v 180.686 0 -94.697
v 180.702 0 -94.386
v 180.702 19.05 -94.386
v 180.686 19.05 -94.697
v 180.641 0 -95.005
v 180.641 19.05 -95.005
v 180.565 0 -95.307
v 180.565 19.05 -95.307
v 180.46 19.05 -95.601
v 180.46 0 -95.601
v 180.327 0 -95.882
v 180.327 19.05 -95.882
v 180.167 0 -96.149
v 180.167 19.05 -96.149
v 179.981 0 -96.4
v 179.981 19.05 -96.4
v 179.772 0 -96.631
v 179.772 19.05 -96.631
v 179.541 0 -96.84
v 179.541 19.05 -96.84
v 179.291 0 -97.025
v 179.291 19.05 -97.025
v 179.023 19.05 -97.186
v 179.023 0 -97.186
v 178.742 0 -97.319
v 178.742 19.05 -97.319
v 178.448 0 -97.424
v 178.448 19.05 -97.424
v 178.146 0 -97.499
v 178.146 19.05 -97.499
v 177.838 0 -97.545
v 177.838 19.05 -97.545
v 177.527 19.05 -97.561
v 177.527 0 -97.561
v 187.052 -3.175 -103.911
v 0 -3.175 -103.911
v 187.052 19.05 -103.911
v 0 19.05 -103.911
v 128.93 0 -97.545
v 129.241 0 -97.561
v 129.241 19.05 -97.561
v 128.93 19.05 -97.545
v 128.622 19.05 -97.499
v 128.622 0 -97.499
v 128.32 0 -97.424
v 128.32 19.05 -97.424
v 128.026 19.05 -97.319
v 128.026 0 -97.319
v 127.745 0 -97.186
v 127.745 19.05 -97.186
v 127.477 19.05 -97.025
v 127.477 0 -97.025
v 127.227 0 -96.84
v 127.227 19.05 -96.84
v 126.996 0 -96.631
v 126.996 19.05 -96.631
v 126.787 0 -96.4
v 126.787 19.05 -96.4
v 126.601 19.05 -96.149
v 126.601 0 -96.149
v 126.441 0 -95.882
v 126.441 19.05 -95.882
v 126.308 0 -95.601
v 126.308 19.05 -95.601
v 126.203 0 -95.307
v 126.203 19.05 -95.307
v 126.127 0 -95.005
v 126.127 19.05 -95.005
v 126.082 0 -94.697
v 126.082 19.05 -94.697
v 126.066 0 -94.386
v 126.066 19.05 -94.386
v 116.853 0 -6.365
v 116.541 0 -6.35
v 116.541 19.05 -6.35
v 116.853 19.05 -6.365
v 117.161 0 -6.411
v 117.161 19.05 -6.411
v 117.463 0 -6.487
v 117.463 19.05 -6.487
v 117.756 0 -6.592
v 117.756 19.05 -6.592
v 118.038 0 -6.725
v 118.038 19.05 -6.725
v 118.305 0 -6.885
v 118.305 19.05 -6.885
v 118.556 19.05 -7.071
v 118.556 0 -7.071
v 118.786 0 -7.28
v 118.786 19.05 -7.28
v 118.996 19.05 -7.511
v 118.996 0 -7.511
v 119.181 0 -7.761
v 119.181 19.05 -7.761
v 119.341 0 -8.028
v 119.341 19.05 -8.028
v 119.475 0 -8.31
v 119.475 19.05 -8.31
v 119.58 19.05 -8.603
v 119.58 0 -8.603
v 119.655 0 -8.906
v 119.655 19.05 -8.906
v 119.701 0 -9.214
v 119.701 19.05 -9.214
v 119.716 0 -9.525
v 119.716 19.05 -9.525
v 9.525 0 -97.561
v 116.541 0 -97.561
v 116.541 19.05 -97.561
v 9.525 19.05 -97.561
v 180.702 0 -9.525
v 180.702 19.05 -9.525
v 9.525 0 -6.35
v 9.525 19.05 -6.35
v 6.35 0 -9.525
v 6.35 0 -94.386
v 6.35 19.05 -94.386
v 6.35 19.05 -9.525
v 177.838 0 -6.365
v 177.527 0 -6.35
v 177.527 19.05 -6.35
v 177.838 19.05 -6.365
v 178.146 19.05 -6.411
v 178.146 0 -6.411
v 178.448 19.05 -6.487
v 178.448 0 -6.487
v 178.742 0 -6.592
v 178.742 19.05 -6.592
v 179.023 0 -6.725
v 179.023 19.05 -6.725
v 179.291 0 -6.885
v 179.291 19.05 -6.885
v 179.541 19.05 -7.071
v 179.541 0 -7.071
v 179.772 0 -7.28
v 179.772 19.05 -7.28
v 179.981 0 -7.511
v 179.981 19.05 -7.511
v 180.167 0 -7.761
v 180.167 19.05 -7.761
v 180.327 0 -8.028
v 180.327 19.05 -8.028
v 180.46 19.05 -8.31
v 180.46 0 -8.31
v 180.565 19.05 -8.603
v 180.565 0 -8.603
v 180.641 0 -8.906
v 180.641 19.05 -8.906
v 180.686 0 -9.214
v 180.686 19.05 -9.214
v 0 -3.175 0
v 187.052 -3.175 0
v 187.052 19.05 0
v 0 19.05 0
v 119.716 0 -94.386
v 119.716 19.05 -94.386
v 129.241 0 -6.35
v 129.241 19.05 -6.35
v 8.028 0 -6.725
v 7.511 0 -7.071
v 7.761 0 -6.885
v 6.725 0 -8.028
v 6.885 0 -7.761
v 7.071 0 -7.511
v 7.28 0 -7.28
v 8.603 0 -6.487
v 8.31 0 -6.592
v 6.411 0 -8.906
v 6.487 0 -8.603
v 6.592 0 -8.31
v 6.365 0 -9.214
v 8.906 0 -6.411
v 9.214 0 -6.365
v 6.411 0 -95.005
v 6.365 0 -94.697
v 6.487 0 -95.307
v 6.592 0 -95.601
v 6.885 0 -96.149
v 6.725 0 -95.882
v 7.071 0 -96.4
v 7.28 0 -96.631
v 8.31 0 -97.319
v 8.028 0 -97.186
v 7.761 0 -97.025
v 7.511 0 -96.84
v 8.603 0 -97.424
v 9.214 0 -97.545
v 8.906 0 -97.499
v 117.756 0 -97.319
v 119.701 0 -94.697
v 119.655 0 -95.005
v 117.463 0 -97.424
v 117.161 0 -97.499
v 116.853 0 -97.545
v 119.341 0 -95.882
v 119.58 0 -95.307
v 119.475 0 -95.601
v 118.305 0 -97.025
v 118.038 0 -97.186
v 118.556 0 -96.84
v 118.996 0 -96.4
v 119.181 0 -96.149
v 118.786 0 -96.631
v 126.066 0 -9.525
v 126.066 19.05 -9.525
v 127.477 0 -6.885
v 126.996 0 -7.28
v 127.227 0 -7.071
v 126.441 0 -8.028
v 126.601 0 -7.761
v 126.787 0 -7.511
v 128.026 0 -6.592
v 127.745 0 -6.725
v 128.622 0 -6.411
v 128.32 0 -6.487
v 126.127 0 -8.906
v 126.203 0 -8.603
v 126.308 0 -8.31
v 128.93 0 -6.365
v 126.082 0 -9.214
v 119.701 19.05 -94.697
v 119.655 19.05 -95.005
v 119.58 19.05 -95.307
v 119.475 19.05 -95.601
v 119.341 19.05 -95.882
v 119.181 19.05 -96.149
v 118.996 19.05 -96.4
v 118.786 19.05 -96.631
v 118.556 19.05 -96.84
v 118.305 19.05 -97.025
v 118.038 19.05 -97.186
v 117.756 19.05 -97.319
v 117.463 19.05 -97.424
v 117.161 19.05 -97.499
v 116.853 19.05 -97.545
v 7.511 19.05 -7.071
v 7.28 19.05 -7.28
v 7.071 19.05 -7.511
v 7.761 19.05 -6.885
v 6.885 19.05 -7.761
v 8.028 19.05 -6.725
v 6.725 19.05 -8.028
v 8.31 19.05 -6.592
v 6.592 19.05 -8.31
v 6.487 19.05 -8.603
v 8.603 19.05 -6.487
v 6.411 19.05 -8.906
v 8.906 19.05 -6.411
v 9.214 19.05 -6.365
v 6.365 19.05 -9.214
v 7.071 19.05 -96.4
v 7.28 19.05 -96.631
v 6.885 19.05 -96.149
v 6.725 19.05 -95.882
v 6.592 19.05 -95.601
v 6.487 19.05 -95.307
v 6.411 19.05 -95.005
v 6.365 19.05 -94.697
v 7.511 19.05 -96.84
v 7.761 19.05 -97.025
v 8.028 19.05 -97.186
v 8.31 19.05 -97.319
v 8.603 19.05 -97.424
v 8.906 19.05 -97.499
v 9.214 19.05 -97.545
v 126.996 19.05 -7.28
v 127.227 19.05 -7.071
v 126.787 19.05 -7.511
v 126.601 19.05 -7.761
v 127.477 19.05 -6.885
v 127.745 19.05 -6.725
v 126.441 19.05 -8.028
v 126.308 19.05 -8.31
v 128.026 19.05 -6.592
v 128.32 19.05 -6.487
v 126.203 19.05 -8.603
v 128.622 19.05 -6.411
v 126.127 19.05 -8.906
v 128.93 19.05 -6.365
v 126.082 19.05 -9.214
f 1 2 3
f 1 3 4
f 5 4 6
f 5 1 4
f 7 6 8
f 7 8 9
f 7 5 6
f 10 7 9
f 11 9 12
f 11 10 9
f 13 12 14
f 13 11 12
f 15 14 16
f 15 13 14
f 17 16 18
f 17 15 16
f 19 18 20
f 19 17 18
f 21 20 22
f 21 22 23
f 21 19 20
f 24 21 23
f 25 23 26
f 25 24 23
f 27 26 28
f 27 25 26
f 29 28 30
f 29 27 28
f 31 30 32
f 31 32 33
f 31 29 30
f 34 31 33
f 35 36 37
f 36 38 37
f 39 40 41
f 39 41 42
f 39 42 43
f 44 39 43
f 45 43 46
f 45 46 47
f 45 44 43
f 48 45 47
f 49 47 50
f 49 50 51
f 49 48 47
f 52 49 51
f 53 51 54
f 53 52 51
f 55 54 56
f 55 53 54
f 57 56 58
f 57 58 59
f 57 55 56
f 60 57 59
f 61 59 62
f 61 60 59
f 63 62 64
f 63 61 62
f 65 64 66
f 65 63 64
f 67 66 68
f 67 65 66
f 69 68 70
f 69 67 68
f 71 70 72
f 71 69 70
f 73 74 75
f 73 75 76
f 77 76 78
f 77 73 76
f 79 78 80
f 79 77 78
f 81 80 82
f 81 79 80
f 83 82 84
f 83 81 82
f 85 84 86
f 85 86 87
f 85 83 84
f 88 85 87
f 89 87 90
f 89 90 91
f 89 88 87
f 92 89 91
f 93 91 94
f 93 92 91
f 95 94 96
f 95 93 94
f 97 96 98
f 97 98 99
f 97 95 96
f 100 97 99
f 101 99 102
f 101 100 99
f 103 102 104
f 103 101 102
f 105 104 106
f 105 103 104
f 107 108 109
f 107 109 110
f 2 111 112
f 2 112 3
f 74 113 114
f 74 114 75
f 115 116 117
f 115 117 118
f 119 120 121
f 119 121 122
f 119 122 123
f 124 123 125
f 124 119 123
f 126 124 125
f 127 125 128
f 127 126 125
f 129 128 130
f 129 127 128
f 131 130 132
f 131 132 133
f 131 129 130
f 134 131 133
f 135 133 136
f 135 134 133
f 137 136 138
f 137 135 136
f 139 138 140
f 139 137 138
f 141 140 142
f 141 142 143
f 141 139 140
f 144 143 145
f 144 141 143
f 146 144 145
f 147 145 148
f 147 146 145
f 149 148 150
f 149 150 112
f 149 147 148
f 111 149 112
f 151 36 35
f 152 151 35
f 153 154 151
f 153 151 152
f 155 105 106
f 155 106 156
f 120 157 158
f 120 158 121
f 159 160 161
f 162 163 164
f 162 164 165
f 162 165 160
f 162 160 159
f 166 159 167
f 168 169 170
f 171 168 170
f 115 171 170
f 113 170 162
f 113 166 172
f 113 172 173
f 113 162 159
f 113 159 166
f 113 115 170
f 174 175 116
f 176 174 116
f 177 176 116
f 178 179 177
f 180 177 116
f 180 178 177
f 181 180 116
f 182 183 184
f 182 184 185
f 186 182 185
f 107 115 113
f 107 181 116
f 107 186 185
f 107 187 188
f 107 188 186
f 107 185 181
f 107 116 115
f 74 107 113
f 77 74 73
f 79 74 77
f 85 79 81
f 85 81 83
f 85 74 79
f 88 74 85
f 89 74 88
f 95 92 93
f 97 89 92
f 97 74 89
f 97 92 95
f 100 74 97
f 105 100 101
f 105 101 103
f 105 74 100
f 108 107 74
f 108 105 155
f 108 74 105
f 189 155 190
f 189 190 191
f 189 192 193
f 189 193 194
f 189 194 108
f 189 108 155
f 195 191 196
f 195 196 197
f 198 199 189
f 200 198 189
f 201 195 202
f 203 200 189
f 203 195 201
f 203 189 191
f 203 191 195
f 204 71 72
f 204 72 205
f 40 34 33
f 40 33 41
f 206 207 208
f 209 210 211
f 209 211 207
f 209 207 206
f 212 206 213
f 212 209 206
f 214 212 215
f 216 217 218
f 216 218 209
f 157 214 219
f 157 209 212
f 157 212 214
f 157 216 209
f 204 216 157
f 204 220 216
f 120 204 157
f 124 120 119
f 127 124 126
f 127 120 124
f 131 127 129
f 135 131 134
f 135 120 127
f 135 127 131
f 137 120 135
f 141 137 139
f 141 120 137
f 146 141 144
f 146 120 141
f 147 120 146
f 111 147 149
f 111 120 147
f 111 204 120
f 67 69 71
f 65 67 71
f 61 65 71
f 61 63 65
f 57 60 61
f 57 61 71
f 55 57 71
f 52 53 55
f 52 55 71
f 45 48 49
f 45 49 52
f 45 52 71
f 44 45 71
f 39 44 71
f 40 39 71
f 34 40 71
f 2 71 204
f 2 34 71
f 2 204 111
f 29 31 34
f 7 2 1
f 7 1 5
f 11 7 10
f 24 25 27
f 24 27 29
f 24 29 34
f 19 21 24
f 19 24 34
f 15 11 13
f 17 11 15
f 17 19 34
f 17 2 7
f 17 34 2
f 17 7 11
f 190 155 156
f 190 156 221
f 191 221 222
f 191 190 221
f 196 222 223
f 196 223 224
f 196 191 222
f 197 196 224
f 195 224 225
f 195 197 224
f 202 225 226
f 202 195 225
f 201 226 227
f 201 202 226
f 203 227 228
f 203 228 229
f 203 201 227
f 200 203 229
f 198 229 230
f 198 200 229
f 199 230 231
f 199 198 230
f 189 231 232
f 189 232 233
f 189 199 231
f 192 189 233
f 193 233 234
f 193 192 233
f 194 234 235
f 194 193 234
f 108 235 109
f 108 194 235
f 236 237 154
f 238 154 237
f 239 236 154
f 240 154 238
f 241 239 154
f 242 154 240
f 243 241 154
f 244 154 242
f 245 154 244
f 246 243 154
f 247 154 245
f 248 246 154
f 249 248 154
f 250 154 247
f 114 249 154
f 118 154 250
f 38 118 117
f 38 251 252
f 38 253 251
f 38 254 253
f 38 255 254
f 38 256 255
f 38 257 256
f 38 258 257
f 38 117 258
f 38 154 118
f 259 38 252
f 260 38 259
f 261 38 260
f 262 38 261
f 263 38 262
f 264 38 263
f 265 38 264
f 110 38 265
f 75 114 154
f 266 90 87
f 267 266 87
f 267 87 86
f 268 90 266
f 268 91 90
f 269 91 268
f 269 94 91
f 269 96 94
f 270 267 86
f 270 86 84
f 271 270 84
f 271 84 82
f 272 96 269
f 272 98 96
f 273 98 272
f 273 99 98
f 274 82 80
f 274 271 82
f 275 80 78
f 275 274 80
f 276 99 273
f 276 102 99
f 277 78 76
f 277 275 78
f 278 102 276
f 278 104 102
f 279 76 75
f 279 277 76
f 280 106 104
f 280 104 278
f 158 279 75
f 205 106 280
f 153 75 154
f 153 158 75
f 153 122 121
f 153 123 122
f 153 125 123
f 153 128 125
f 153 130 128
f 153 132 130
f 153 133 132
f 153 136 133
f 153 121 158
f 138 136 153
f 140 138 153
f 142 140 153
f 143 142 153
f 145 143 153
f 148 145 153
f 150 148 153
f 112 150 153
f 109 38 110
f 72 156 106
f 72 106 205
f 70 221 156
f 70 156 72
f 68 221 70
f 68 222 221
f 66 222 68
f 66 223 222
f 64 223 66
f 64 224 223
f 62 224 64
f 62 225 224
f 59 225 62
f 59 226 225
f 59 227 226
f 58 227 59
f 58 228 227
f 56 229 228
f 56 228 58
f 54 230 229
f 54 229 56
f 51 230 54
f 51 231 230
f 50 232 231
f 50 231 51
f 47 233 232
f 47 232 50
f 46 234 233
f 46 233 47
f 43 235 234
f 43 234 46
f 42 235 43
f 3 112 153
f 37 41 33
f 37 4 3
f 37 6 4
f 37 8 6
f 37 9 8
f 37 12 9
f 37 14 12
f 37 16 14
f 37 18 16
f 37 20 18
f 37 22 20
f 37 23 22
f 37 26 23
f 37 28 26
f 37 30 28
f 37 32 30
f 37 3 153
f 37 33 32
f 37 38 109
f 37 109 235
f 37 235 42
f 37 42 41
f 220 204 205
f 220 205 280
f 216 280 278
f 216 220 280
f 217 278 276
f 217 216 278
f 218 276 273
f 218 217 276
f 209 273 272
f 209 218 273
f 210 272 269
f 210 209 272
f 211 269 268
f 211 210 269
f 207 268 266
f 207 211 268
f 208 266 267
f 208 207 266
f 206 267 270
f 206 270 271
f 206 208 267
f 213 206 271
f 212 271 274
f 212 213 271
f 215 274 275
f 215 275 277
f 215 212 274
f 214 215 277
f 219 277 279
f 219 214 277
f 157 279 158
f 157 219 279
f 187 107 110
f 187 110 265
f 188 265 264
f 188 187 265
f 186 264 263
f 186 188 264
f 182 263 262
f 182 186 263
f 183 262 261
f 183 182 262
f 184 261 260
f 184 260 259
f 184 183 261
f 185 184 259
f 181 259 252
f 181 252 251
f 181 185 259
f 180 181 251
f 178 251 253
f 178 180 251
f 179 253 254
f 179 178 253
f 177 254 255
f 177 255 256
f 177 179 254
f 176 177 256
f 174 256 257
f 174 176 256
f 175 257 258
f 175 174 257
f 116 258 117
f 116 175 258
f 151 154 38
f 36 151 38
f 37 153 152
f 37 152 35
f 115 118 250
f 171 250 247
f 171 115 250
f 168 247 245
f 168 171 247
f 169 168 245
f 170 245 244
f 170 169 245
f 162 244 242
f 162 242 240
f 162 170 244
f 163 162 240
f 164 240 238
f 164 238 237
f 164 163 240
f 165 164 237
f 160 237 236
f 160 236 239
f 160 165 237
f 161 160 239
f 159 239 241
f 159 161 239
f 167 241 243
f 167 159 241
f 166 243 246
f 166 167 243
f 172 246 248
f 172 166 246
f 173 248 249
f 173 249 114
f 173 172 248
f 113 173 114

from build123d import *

# Parameters (mm, degrees)
SKETCH11_W     = 187.05178758
SKETCH11_H     = 103.91050065
EXTRUDE3_DEPTH = 19.05
SKETCH12_W     = 187.05178758
SKETCH12_H     = 103.91050065
EXTRUDE4_DEPTH = 3.175


with BuildPart() as part:
    # Sketch11 → Extrude3 (new body)
    with BuildSketch(Plane(origin=(0, 0, 0), x_dir=(1, 0, 0), z_dir=(0, 1, 0))):
        with Locations((93.52589379, 51.955250325)):
            Rectangle(SKETCH11_W, SKETCH11_H)
        with BuildLine():
            Line((9.525, 6.35), (116.541319734, 6.35))
            ThreePointArc((116.541319734, 6.35), (118.786383764, 7.27993597), (119.716319734, 9.525))
            Line((119.716319734, 9.525), (119.716319734, 94.38550065))
            ThreePointArc((119.716319734, 94.38550065), (118.786383764, 96.63056468), (116.541319734, 97.56050065))
            Line((116.541319734, 97.56050065), (9.525, 97.56050065))
            ThreePointArc((9.525, 97.56050065), (7.27993597, 96.63056468), (6.35, 94.38550065))
            Line((6.35, 94.38550065), (6.35, 9.525))
            ThreePointArc((6.35, 9.525), (7.27993597, 7.27993597), (9.525, 6.35))
        make_face(mode=Mode.SUBTRACT)
        with BuildLine():
            Line((180.70178758, 9.525), (180.70178758, 94.38550065))
            ThreePointArc((180.70178758, 94.38550065), (179.77185161, 96.63056468), (177.52678758, 97.56050065))
            Line((177.52678758, 97.56050065), (129.241319734, 97.56050065))
            ThreePointArc((129.241319734, 97.56050065), (126.996255703, 96.63056468), (126.066319734, 94.38550065))
            Line((126.066319734, 94.38550065), (126.066319734, 9.525))
            ThreePointArc((126.066319734, 9.525), (126.996255703, 7.27993597), (129.241319734, 6.35))
            Line((129.241319734, 6.35), (177.52678758, 6.35))
            ThreePointArc((177.52678758, 6.35), (179.77185161, 7.27993597), (180.70178758, 9.525))
        make_face(mode=Mode.SUBTRACT)
    extrude(amount=EXTRUDE3_DEPTH)

    # Sketch12 → Extrude4 (add)
    with BuildSketch(Plane(origin=(0, 0, 0), x_dir=(1, 0, 0), z_dir=(0, 1, 0))):
        with Locations((93.52589379, 51.955250325)):
            Rectangle(SKETCH12_W, SKETCH12_H)
    extrude(amount=-EXTRUDE4_DEPTH)


solid = part.part
